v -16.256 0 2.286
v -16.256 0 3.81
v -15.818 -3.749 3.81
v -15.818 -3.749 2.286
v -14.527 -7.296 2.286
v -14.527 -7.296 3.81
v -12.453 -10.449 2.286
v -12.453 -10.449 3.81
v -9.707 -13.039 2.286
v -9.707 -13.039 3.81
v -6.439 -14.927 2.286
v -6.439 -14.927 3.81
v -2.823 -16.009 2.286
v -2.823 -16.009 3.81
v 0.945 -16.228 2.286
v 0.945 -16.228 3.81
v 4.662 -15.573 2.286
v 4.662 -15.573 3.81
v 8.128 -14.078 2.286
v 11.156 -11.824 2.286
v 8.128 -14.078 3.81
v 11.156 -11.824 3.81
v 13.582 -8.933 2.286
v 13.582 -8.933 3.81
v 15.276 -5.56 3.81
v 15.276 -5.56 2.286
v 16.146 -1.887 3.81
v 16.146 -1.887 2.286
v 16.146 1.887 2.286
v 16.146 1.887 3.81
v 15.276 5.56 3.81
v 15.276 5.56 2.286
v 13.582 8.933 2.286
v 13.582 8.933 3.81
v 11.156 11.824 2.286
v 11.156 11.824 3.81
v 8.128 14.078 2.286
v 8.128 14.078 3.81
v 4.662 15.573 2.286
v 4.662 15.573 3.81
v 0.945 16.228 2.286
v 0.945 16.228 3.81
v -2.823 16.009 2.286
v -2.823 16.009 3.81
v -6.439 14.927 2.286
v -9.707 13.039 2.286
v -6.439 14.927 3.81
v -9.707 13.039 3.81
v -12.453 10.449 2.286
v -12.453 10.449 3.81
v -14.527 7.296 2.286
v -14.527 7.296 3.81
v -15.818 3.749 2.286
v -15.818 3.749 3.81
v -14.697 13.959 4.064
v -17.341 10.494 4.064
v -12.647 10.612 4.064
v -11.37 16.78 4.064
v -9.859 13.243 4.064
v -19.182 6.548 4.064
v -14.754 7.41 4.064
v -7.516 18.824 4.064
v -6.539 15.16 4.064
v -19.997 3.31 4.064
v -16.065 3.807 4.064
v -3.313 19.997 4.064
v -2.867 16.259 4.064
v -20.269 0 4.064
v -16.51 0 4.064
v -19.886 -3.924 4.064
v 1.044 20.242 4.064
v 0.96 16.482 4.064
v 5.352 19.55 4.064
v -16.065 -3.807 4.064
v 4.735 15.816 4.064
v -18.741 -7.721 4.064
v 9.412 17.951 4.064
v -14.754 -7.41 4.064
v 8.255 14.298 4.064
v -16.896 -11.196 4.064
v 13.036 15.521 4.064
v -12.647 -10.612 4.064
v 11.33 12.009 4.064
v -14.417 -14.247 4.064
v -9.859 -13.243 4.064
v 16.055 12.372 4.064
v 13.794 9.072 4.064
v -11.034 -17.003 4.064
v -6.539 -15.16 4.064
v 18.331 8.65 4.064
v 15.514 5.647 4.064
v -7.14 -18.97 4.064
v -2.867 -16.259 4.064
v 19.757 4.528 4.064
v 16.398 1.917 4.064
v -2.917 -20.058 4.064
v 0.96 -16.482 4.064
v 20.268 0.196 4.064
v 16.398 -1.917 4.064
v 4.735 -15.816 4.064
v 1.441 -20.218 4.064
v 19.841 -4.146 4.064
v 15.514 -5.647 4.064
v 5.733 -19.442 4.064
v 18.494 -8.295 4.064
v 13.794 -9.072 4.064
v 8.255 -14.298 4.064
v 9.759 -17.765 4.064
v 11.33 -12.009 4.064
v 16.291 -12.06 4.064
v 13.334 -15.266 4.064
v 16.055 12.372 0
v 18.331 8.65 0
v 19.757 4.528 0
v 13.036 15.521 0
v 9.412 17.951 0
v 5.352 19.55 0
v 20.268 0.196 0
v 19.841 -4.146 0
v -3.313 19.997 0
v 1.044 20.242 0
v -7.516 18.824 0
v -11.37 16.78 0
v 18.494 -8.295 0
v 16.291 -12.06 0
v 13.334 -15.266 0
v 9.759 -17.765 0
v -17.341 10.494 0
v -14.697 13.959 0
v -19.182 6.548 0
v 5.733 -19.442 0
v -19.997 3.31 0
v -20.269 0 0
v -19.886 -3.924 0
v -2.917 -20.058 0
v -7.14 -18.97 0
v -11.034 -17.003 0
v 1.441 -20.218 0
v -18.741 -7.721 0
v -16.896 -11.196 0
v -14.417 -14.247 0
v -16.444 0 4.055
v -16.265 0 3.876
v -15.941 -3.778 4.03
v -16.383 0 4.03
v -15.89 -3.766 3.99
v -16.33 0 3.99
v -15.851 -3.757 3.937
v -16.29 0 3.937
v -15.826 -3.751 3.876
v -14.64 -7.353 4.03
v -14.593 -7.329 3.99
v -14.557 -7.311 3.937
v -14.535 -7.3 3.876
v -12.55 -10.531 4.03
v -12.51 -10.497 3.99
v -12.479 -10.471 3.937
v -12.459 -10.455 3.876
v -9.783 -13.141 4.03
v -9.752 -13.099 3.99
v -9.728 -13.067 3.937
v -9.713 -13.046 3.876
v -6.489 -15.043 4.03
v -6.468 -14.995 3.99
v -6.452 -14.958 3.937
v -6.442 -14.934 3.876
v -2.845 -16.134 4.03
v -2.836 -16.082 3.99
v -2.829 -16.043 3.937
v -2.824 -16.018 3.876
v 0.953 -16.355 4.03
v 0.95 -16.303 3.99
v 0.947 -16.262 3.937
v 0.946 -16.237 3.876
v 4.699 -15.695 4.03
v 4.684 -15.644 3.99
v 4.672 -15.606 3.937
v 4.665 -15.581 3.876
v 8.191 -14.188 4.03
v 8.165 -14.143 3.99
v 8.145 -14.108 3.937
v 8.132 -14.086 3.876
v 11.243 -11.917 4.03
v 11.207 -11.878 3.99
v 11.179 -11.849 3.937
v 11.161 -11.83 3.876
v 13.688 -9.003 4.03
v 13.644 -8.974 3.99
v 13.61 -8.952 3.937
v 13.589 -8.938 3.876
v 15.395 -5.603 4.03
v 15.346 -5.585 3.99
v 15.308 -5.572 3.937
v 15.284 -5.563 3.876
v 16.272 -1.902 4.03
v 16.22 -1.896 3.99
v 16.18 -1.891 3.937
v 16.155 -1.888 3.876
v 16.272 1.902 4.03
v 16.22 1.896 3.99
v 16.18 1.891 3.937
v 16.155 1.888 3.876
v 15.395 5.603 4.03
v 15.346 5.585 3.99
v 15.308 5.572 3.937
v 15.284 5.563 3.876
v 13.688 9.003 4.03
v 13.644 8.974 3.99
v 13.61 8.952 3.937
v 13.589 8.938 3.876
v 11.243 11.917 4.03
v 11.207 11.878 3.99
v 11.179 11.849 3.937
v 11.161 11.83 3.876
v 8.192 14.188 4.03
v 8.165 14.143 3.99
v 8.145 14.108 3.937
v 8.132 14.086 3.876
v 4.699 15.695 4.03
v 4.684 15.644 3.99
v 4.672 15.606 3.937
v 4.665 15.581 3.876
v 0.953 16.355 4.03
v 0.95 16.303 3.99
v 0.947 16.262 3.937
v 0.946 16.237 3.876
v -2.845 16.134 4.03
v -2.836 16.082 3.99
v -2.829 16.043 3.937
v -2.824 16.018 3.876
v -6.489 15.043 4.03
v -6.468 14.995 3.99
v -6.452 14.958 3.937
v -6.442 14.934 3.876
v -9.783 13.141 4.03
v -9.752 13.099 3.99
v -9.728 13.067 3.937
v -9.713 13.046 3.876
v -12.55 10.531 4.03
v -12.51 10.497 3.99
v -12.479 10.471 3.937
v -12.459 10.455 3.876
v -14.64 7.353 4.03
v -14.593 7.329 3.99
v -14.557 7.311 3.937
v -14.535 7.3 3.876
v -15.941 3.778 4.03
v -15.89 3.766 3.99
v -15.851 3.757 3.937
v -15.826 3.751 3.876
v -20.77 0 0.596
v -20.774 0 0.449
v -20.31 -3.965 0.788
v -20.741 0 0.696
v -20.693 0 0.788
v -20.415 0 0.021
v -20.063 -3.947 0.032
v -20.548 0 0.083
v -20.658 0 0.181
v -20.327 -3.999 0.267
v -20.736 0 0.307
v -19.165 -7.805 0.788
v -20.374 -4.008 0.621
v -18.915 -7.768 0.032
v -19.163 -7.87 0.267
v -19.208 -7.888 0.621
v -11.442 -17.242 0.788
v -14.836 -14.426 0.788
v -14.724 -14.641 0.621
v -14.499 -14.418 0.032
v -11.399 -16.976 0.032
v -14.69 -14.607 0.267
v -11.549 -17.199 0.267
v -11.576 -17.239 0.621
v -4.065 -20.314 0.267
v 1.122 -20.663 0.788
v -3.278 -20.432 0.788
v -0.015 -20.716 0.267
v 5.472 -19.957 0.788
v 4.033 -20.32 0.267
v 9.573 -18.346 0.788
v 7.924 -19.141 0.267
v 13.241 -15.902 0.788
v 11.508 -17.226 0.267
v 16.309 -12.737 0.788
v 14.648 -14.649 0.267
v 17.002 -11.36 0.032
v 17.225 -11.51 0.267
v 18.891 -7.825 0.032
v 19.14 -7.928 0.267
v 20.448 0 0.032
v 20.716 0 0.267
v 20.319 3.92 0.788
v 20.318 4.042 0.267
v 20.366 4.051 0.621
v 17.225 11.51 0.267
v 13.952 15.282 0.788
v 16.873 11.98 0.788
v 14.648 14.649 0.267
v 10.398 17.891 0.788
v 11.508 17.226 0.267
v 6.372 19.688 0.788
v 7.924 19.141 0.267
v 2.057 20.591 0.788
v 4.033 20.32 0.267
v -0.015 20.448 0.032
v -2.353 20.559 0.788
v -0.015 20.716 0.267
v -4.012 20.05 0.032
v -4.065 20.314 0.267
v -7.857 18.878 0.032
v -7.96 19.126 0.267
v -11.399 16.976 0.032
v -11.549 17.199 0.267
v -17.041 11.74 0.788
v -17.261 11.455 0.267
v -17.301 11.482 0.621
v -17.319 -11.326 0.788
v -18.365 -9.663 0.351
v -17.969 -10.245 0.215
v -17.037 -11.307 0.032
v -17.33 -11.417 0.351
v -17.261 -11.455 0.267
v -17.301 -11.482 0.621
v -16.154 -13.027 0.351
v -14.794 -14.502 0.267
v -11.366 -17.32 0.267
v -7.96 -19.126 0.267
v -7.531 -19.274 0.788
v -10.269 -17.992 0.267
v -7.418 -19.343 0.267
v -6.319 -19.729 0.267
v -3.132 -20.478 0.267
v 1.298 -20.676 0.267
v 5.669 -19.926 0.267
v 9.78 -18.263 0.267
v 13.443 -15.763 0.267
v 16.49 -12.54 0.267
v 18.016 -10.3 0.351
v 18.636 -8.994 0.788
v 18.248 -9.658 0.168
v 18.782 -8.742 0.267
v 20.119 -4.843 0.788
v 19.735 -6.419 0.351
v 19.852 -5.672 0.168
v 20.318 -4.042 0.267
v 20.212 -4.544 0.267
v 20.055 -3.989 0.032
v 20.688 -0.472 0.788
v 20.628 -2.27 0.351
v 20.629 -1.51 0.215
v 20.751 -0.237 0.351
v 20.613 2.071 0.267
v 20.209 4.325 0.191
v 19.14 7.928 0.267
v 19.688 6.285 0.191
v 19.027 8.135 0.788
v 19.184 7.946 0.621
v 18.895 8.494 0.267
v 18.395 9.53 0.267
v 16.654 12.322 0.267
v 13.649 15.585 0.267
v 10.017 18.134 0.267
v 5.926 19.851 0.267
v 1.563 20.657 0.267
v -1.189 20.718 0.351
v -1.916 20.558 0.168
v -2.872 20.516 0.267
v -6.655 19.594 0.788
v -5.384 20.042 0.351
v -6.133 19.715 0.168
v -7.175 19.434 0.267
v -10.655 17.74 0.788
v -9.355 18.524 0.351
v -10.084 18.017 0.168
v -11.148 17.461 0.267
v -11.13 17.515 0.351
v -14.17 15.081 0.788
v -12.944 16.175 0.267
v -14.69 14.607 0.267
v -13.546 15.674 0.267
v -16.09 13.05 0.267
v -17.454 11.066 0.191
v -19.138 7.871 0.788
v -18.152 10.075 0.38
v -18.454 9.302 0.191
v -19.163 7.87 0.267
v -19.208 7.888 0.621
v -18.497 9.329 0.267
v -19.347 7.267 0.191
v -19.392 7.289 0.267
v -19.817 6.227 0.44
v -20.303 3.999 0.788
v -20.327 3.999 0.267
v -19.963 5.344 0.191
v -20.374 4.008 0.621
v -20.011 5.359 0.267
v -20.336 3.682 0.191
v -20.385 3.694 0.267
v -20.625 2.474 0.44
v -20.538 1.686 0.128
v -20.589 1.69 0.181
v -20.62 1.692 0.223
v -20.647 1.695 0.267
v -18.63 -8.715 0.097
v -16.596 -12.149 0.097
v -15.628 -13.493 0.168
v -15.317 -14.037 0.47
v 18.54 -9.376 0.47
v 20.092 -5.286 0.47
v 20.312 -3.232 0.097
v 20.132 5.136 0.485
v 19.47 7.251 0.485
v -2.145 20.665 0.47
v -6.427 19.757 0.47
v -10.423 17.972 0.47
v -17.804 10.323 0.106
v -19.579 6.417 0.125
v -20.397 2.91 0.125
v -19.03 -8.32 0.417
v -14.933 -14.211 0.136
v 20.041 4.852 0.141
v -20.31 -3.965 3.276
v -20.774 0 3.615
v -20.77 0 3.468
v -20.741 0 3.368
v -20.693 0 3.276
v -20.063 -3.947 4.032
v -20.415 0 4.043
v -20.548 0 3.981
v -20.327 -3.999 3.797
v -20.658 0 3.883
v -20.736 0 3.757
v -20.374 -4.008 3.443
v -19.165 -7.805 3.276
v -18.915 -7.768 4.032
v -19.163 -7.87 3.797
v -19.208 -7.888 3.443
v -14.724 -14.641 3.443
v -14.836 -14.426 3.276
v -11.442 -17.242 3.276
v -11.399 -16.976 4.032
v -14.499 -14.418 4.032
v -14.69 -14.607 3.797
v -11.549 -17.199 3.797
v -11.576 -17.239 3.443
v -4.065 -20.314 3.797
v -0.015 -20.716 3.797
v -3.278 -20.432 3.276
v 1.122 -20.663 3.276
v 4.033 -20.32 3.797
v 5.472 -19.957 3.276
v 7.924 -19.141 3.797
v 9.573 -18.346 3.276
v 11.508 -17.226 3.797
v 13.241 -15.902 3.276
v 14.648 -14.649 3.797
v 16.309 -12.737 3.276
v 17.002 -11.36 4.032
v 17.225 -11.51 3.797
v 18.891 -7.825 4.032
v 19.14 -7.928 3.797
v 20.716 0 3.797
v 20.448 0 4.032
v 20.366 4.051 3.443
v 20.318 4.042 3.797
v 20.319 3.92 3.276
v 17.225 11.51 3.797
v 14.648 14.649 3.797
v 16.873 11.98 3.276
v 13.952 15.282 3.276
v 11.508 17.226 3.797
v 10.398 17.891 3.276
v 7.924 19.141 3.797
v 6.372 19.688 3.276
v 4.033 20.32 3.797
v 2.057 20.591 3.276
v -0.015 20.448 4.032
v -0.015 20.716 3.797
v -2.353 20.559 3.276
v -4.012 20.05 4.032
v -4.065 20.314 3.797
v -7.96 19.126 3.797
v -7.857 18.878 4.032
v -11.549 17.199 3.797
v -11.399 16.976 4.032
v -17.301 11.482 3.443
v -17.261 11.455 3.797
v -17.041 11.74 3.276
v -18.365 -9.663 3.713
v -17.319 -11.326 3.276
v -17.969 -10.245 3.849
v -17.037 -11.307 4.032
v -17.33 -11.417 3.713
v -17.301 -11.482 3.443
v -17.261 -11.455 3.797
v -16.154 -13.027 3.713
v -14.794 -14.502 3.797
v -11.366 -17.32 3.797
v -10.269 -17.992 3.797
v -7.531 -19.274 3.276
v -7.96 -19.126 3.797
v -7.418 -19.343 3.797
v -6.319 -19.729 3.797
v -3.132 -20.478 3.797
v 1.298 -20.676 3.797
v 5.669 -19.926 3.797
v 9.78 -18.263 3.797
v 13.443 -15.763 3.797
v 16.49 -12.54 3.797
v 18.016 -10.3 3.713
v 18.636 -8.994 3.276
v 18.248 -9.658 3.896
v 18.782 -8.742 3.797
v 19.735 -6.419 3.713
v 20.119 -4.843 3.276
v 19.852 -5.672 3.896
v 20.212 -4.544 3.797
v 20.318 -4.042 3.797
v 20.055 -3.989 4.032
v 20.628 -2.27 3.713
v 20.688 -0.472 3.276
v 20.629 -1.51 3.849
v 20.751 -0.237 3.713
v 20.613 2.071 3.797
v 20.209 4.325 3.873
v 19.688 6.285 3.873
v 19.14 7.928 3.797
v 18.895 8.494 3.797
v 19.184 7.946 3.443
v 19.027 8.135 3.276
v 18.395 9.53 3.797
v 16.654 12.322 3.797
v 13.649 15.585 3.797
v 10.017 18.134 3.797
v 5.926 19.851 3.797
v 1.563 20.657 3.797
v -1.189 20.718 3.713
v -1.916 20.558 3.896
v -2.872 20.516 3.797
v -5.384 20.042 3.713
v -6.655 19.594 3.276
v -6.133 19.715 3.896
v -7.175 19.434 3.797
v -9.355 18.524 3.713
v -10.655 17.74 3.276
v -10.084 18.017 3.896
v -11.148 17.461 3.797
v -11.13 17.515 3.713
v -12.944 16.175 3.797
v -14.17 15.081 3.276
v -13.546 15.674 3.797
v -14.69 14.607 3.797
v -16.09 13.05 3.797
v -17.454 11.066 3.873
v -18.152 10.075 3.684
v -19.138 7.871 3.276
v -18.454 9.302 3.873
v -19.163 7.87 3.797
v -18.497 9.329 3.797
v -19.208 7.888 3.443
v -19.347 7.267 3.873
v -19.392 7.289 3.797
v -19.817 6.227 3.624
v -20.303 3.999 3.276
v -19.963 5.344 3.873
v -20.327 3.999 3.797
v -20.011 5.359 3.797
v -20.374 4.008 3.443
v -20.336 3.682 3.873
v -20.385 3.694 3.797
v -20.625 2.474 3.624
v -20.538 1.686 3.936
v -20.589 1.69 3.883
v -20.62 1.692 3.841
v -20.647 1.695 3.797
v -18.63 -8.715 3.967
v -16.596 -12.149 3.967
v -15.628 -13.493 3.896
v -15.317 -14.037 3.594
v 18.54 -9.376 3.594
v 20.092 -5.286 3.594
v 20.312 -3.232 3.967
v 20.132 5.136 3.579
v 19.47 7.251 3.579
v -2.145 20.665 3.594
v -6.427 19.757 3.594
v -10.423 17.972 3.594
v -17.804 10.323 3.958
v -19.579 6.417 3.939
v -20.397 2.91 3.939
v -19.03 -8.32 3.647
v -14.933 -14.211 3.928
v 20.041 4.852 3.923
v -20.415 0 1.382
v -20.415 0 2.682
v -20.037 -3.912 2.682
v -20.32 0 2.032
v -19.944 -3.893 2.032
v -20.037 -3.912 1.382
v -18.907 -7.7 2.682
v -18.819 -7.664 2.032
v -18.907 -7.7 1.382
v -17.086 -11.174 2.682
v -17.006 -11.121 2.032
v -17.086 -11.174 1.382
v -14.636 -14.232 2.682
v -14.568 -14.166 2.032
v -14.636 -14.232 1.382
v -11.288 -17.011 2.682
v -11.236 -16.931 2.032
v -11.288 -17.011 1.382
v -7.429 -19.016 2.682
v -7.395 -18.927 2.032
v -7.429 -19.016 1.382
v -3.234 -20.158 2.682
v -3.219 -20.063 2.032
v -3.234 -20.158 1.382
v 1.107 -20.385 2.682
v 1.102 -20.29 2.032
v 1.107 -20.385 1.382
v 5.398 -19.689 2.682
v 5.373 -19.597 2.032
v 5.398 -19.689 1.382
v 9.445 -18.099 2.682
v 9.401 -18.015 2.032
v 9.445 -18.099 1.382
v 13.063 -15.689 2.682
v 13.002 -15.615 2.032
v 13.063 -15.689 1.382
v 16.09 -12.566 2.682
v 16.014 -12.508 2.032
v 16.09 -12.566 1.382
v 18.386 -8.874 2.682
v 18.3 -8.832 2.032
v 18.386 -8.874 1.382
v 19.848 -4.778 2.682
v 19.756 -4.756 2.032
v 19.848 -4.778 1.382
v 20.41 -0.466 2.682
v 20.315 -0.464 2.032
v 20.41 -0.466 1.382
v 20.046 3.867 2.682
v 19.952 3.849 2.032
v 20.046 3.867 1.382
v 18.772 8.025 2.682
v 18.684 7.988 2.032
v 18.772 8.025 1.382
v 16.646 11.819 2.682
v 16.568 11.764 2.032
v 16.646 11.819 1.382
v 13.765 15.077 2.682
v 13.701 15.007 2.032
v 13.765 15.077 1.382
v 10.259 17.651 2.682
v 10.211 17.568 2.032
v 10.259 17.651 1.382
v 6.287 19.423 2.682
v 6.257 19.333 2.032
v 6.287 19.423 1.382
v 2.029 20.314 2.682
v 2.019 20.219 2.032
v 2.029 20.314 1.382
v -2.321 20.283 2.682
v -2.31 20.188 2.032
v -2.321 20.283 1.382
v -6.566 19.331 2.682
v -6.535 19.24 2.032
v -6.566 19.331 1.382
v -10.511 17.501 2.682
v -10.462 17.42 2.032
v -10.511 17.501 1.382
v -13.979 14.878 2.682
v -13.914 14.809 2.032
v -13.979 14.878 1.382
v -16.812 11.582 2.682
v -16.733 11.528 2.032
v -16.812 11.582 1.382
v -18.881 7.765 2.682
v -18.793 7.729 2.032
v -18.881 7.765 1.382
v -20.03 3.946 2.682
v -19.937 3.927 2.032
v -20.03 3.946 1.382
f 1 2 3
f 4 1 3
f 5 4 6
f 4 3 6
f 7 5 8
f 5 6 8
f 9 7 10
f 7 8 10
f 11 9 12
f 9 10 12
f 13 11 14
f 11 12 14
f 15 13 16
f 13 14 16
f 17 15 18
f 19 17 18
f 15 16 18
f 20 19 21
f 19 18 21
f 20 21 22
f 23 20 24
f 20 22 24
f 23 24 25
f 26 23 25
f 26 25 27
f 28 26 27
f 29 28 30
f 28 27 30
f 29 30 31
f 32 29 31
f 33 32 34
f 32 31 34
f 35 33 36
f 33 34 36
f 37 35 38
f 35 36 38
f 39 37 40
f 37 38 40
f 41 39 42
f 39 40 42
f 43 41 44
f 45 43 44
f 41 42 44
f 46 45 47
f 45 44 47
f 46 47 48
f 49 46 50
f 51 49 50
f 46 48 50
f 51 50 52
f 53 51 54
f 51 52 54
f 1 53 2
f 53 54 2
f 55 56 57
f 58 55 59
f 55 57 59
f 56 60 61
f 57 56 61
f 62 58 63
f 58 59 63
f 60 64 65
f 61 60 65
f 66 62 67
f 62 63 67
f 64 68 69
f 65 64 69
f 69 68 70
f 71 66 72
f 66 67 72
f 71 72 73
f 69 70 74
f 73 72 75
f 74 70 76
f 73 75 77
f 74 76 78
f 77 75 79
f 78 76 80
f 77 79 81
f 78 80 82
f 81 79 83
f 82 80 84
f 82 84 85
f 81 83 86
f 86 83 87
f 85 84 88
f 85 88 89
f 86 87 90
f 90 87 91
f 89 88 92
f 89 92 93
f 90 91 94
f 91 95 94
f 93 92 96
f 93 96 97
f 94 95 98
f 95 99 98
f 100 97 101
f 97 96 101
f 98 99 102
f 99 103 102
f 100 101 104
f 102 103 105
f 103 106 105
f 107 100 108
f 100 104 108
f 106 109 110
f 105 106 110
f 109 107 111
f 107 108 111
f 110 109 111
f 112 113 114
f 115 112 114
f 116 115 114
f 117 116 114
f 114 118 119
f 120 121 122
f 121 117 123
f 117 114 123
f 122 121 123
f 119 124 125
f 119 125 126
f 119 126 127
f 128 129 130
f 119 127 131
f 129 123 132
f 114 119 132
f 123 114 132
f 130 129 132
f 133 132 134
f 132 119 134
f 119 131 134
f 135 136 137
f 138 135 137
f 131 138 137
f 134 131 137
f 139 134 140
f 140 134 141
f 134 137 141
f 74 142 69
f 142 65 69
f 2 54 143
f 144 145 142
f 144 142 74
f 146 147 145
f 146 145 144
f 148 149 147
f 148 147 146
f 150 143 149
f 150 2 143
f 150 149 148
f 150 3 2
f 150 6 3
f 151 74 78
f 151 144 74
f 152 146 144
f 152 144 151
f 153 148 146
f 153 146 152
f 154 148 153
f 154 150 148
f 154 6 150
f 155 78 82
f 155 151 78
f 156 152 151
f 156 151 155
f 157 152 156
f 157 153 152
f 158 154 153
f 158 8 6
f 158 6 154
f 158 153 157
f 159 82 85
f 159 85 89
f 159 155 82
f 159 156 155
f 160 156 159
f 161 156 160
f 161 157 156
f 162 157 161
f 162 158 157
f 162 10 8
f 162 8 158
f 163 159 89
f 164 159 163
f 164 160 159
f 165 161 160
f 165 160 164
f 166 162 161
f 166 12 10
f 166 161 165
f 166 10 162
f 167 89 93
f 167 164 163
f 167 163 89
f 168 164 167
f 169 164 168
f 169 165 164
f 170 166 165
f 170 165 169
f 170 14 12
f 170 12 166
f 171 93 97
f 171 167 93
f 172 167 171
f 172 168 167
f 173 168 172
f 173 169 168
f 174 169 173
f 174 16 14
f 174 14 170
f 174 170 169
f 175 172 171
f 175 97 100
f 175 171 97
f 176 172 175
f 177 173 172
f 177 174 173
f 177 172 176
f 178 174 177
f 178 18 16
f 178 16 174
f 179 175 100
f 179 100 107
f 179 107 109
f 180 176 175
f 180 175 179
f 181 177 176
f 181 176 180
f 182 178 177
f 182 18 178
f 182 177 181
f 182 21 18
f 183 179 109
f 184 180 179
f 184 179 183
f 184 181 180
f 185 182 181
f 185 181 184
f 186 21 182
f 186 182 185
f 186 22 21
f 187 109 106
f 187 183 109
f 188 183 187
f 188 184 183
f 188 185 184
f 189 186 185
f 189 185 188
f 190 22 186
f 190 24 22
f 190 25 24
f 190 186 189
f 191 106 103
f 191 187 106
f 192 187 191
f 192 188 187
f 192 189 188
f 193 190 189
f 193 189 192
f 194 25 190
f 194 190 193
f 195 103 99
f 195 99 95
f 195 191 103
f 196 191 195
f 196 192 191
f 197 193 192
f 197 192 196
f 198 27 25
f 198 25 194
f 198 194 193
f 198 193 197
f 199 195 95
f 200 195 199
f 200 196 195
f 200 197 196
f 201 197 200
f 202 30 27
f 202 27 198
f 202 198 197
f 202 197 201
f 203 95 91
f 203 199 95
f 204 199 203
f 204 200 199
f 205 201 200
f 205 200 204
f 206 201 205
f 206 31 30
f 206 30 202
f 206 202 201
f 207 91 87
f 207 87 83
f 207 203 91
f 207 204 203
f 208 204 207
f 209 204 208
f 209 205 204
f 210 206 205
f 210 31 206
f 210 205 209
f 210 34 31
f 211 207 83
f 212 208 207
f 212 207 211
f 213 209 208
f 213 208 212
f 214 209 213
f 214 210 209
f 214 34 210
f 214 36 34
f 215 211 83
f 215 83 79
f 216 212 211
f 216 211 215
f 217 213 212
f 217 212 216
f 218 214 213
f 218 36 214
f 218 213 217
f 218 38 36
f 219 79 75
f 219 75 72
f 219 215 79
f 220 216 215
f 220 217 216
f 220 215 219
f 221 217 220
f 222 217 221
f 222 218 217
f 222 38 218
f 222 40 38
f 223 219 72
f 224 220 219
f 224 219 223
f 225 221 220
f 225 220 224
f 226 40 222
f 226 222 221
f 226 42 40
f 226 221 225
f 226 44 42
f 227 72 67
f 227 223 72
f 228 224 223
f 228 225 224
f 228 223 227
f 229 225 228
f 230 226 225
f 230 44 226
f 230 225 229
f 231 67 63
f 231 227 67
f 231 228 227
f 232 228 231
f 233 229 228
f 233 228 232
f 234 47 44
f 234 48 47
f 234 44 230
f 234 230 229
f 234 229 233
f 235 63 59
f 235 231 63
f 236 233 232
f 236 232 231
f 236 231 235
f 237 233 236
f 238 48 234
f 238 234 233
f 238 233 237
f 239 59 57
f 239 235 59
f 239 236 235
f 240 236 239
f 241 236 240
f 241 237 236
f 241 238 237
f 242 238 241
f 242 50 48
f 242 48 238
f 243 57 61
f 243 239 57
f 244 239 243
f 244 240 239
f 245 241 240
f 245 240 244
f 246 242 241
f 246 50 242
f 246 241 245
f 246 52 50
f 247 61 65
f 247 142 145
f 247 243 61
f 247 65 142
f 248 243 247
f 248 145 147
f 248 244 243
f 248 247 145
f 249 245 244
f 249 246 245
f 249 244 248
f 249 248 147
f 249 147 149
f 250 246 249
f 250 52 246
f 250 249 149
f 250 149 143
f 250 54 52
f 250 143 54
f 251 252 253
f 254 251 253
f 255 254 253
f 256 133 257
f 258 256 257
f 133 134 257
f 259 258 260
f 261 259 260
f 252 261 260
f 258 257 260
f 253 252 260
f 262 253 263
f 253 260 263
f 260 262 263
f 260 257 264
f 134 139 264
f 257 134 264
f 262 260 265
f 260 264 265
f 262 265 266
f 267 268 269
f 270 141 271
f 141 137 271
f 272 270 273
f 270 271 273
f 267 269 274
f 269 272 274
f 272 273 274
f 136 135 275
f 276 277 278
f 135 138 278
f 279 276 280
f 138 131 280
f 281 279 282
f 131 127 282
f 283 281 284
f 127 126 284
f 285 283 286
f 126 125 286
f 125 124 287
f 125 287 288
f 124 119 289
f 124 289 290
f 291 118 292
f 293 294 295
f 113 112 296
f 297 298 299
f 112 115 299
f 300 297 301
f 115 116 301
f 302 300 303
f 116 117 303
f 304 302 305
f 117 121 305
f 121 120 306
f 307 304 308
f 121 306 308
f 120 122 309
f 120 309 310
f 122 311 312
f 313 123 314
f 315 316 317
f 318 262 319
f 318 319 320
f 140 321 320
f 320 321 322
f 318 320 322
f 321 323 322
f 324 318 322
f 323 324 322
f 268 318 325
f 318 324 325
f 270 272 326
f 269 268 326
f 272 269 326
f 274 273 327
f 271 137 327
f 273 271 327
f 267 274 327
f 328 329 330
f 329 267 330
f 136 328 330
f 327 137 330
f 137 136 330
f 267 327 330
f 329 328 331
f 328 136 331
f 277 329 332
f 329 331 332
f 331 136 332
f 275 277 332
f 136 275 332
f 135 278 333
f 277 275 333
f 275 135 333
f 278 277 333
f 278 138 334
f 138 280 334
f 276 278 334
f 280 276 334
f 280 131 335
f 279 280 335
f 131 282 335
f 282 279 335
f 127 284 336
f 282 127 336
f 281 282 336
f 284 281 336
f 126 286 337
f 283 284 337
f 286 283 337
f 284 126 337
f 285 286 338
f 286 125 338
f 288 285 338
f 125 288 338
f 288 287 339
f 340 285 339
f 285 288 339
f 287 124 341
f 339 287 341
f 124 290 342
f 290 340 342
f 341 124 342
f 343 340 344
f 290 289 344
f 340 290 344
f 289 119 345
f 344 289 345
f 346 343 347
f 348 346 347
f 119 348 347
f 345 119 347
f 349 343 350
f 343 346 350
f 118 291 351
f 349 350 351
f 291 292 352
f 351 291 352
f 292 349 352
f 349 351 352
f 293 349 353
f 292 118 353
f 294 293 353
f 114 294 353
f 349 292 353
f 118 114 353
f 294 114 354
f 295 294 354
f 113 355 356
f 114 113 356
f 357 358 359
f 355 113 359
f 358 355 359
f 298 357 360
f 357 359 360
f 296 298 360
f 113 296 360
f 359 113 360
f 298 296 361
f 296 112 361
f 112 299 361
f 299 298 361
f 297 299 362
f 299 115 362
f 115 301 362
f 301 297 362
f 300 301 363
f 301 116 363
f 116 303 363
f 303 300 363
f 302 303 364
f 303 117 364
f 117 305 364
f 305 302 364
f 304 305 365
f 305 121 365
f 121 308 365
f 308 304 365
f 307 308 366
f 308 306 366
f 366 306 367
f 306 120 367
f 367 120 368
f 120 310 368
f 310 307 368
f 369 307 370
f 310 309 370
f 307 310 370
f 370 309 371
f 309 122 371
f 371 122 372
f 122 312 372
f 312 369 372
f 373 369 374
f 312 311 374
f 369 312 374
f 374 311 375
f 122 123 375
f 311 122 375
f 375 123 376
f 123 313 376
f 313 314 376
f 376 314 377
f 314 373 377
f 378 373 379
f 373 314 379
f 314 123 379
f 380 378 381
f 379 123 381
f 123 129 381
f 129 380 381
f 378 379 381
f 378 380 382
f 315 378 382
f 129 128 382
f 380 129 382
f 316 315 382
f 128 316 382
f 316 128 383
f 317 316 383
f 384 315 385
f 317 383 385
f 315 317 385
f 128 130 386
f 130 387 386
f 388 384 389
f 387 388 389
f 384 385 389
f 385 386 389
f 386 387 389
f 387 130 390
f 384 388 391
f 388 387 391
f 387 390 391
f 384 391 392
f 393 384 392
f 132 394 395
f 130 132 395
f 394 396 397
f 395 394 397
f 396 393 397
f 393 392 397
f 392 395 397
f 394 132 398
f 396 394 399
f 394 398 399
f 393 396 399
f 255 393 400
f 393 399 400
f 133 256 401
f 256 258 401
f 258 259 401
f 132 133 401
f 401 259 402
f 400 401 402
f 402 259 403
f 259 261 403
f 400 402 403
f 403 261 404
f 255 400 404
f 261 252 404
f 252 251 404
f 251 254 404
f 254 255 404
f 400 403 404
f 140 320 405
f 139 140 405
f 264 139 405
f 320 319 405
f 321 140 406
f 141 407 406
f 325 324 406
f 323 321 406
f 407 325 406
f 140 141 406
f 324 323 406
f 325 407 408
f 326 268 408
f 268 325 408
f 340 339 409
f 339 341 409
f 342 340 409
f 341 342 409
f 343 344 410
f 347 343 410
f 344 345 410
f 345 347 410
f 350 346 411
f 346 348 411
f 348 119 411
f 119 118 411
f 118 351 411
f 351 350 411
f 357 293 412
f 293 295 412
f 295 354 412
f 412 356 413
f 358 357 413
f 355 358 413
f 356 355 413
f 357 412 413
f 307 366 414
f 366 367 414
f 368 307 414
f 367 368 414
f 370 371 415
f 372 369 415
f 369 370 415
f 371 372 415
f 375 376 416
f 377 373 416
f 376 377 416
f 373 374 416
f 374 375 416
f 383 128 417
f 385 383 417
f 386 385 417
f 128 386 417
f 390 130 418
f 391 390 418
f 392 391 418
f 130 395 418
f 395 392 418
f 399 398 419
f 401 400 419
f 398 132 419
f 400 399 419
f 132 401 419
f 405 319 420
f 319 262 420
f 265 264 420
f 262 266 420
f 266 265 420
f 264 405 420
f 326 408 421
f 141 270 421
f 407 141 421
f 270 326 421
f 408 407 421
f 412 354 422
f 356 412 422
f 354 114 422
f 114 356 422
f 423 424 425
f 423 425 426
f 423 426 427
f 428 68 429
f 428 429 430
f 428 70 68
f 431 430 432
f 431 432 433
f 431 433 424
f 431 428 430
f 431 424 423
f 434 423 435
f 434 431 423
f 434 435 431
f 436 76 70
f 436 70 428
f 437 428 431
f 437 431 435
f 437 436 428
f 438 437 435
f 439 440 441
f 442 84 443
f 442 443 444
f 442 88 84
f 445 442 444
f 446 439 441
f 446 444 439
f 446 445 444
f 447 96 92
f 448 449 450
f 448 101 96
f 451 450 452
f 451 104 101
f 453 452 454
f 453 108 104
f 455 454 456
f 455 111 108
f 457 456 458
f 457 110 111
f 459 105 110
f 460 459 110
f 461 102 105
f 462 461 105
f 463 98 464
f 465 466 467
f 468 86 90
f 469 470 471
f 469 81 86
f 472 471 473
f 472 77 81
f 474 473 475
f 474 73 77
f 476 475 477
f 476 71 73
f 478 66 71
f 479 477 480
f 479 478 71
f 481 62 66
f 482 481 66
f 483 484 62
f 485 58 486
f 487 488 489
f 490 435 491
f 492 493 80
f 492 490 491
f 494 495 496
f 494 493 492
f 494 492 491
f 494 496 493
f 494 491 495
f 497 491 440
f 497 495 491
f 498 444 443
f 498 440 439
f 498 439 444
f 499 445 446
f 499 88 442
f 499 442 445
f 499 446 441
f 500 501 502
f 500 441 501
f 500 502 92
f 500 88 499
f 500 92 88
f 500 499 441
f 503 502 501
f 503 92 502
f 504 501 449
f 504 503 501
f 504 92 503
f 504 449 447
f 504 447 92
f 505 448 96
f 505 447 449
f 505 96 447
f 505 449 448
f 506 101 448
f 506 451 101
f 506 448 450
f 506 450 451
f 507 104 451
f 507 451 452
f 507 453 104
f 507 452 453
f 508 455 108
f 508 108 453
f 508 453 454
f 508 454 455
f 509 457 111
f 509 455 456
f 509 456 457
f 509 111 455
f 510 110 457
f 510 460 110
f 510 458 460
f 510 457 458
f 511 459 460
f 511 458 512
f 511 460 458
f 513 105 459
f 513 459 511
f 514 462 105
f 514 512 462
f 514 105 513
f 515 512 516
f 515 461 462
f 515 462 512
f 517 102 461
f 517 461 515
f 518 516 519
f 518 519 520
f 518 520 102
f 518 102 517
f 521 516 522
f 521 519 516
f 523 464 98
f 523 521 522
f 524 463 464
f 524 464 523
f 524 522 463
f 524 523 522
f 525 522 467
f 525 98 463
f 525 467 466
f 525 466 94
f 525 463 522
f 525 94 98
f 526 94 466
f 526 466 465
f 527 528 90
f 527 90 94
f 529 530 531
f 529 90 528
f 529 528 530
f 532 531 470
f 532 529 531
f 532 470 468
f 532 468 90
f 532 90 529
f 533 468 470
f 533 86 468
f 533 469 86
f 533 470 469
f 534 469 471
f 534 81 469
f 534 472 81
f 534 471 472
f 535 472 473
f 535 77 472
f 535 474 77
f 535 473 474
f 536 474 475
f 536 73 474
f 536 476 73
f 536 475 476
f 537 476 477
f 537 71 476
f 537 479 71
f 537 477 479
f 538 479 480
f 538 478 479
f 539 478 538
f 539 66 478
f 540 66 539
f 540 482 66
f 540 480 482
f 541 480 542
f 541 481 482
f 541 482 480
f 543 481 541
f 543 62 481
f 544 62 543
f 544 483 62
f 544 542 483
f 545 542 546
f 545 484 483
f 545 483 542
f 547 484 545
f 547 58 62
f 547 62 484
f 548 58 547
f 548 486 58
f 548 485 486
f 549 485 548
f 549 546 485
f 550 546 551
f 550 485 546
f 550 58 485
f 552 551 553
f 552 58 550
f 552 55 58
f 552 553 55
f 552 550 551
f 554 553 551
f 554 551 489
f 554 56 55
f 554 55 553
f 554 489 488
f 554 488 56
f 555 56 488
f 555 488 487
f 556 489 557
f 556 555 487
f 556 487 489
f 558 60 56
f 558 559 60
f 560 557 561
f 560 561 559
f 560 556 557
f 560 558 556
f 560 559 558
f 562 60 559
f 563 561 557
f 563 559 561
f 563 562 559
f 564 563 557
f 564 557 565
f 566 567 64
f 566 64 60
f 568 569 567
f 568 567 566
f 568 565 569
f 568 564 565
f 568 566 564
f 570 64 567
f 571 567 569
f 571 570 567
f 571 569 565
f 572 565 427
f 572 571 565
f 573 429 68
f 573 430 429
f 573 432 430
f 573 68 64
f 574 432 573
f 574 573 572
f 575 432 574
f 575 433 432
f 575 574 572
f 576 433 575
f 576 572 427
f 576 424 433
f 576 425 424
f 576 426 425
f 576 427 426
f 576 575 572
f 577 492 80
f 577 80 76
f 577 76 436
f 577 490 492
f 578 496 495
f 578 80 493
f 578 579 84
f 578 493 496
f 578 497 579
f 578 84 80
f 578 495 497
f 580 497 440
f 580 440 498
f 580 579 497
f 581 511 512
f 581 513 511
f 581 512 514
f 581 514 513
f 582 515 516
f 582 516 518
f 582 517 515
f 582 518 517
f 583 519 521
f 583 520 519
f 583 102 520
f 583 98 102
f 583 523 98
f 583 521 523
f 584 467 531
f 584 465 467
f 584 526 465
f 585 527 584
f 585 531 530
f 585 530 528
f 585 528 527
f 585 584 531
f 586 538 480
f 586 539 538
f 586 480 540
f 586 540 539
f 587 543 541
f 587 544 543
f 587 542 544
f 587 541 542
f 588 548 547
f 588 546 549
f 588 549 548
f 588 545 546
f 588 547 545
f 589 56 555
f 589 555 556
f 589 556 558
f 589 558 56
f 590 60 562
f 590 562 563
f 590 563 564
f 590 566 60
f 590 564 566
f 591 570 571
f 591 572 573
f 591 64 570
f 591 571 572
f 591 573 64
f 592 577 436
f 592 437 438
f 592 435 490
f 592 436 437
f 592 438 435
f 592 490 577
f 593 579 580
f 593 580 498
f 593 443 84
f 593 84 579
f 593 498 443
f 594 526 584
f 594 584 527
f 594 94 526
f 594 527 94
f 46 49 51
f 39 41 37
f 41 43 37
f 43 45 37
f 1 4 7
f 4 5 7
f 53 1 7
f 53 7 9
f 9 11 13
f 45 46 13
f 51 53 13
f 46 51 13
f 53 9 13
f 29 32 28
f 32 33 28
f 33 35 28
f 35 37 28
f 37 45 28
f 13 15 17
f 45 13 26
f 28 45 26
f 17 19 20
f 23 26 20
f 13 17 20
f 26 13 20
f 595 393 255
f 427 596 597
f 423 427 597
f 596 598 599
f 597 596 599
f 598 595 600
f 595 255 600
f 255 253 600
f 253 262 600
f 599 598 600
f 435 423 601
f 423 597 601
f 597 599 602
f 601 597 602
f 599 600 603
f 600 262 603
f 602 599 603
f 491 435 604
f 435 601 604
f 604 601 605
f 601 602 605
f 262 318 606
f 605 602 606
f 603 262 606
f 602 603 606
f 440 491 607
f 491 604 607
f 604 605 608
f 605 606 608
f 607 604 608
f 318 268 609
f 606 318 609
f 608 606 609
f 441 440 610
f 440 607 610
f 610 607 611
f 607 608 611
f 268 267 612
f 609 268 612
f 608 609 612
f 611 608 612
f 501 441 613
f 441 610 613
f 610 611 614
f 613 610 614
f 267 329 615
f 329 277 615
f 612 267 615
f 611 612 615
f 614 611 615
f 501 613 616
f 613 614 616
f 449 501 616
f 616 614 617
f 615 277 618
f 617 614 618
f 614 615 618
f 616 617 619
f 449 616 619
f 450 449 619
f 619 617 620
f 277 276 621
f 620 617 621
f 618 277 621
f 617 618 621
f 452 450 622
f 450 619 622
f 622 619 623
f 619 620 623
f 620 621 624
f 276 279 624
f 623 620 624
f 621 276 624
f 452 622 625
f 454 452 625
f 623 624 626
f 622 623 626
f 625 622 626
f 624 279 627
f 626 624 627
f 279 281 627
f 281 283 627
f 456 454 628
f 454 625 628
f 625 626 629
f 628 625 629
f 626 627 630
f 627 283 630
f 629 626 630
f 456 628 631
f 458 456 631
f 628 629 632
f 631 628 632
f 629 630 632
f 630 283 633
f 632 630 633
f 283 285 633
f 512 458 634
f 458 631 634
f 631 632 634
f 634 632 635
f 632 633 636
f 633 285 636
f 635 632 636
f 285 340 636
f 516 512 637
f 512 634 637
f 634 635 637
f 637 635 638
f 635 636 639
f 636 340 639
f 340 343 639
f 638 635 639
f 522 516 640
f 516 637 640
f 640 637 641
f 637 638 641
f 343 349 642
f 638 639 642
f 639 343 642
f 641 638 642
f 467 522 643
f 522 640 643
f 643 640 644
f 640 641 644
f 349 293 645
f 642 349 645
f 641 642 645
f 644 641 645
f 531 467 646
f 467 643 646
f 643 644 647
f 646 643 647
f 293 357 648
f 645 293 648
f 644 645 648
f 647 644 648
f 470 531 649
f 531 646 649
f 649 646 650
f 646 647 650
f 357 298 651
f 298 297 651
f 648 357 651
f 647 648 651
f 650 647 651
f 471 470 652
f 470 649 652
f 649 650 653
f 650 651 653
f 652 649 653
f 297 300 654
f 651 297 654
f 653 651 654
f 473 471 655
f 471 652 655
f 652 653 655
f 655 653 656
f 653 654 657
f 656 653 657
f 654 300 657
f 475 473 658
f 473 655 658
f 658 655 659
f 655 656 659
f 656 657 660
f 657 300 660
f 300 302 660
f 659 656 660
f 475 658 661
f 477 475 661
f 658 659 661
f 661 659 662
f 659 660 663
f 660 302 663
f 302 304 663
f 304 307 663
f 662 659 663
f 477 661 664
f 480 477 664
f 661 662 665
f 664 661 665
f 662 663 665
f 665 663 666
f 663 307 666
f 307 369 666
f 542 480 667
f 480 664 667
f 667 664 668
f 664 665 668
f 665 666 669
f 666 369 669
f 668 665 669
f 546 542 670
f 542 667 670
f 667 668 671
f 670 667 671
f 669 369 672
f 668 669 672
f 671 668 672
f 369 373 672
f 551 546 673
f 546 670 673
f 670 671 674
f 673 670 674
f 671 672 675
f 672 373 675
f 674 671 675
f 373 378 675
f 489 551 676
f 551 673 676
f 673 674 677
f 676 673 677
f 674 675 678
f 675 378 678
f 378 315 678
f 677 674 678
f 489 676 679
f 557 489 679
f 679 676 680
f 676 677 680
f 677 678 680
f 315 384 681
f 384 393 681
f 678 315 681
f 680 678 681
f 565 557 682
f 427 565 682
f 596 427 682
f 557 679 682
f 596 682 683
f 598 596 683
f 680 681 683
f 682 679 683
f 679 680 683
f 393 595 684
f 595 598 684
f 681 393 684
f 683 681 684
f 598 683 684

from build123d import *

# Parameters (mm, degrees)
F2_R = 0.508
F3_R = 0.254


with BuildPart() as f1:
    # F0 (on Front) → F1 (revolve)
    with BuildSketch(Plane.XZ):
        with BuildLine():
            Line((-21.59, 0), (0, 0))
            Line((0, 0), (0, 2.286))
            Line((0, 2.286), (-16.256, 2.286))
            Line((-16.256, 2.286), (-16.256, 4.064))
            Line((-16.256, 4.064), (-21.59, 4.064))
            ThreePointArc((-21.59, 4.064), (-20.32, 2.032), (-21.59, 0))
        make_face()
    revolve(axis=Axis((0, 0, 1.143), (0, 0, 1)))

    # F2
    f2_edges = [f1.edges().sort_by_distance(p)[0] for p in [
        (21.59, 0, 4.064),
        (21.59, 0, 0),
    ]]
    fillet(f2_edges, radius=F2_R)

    # F3
    f3_edges = [f1.edges().sort_by_distance(p)[0] for p in [
        (16.256, 0, 4.064),
    ]]
    fillet(f3_edges, radius=F3_R)


solid = f1.part
